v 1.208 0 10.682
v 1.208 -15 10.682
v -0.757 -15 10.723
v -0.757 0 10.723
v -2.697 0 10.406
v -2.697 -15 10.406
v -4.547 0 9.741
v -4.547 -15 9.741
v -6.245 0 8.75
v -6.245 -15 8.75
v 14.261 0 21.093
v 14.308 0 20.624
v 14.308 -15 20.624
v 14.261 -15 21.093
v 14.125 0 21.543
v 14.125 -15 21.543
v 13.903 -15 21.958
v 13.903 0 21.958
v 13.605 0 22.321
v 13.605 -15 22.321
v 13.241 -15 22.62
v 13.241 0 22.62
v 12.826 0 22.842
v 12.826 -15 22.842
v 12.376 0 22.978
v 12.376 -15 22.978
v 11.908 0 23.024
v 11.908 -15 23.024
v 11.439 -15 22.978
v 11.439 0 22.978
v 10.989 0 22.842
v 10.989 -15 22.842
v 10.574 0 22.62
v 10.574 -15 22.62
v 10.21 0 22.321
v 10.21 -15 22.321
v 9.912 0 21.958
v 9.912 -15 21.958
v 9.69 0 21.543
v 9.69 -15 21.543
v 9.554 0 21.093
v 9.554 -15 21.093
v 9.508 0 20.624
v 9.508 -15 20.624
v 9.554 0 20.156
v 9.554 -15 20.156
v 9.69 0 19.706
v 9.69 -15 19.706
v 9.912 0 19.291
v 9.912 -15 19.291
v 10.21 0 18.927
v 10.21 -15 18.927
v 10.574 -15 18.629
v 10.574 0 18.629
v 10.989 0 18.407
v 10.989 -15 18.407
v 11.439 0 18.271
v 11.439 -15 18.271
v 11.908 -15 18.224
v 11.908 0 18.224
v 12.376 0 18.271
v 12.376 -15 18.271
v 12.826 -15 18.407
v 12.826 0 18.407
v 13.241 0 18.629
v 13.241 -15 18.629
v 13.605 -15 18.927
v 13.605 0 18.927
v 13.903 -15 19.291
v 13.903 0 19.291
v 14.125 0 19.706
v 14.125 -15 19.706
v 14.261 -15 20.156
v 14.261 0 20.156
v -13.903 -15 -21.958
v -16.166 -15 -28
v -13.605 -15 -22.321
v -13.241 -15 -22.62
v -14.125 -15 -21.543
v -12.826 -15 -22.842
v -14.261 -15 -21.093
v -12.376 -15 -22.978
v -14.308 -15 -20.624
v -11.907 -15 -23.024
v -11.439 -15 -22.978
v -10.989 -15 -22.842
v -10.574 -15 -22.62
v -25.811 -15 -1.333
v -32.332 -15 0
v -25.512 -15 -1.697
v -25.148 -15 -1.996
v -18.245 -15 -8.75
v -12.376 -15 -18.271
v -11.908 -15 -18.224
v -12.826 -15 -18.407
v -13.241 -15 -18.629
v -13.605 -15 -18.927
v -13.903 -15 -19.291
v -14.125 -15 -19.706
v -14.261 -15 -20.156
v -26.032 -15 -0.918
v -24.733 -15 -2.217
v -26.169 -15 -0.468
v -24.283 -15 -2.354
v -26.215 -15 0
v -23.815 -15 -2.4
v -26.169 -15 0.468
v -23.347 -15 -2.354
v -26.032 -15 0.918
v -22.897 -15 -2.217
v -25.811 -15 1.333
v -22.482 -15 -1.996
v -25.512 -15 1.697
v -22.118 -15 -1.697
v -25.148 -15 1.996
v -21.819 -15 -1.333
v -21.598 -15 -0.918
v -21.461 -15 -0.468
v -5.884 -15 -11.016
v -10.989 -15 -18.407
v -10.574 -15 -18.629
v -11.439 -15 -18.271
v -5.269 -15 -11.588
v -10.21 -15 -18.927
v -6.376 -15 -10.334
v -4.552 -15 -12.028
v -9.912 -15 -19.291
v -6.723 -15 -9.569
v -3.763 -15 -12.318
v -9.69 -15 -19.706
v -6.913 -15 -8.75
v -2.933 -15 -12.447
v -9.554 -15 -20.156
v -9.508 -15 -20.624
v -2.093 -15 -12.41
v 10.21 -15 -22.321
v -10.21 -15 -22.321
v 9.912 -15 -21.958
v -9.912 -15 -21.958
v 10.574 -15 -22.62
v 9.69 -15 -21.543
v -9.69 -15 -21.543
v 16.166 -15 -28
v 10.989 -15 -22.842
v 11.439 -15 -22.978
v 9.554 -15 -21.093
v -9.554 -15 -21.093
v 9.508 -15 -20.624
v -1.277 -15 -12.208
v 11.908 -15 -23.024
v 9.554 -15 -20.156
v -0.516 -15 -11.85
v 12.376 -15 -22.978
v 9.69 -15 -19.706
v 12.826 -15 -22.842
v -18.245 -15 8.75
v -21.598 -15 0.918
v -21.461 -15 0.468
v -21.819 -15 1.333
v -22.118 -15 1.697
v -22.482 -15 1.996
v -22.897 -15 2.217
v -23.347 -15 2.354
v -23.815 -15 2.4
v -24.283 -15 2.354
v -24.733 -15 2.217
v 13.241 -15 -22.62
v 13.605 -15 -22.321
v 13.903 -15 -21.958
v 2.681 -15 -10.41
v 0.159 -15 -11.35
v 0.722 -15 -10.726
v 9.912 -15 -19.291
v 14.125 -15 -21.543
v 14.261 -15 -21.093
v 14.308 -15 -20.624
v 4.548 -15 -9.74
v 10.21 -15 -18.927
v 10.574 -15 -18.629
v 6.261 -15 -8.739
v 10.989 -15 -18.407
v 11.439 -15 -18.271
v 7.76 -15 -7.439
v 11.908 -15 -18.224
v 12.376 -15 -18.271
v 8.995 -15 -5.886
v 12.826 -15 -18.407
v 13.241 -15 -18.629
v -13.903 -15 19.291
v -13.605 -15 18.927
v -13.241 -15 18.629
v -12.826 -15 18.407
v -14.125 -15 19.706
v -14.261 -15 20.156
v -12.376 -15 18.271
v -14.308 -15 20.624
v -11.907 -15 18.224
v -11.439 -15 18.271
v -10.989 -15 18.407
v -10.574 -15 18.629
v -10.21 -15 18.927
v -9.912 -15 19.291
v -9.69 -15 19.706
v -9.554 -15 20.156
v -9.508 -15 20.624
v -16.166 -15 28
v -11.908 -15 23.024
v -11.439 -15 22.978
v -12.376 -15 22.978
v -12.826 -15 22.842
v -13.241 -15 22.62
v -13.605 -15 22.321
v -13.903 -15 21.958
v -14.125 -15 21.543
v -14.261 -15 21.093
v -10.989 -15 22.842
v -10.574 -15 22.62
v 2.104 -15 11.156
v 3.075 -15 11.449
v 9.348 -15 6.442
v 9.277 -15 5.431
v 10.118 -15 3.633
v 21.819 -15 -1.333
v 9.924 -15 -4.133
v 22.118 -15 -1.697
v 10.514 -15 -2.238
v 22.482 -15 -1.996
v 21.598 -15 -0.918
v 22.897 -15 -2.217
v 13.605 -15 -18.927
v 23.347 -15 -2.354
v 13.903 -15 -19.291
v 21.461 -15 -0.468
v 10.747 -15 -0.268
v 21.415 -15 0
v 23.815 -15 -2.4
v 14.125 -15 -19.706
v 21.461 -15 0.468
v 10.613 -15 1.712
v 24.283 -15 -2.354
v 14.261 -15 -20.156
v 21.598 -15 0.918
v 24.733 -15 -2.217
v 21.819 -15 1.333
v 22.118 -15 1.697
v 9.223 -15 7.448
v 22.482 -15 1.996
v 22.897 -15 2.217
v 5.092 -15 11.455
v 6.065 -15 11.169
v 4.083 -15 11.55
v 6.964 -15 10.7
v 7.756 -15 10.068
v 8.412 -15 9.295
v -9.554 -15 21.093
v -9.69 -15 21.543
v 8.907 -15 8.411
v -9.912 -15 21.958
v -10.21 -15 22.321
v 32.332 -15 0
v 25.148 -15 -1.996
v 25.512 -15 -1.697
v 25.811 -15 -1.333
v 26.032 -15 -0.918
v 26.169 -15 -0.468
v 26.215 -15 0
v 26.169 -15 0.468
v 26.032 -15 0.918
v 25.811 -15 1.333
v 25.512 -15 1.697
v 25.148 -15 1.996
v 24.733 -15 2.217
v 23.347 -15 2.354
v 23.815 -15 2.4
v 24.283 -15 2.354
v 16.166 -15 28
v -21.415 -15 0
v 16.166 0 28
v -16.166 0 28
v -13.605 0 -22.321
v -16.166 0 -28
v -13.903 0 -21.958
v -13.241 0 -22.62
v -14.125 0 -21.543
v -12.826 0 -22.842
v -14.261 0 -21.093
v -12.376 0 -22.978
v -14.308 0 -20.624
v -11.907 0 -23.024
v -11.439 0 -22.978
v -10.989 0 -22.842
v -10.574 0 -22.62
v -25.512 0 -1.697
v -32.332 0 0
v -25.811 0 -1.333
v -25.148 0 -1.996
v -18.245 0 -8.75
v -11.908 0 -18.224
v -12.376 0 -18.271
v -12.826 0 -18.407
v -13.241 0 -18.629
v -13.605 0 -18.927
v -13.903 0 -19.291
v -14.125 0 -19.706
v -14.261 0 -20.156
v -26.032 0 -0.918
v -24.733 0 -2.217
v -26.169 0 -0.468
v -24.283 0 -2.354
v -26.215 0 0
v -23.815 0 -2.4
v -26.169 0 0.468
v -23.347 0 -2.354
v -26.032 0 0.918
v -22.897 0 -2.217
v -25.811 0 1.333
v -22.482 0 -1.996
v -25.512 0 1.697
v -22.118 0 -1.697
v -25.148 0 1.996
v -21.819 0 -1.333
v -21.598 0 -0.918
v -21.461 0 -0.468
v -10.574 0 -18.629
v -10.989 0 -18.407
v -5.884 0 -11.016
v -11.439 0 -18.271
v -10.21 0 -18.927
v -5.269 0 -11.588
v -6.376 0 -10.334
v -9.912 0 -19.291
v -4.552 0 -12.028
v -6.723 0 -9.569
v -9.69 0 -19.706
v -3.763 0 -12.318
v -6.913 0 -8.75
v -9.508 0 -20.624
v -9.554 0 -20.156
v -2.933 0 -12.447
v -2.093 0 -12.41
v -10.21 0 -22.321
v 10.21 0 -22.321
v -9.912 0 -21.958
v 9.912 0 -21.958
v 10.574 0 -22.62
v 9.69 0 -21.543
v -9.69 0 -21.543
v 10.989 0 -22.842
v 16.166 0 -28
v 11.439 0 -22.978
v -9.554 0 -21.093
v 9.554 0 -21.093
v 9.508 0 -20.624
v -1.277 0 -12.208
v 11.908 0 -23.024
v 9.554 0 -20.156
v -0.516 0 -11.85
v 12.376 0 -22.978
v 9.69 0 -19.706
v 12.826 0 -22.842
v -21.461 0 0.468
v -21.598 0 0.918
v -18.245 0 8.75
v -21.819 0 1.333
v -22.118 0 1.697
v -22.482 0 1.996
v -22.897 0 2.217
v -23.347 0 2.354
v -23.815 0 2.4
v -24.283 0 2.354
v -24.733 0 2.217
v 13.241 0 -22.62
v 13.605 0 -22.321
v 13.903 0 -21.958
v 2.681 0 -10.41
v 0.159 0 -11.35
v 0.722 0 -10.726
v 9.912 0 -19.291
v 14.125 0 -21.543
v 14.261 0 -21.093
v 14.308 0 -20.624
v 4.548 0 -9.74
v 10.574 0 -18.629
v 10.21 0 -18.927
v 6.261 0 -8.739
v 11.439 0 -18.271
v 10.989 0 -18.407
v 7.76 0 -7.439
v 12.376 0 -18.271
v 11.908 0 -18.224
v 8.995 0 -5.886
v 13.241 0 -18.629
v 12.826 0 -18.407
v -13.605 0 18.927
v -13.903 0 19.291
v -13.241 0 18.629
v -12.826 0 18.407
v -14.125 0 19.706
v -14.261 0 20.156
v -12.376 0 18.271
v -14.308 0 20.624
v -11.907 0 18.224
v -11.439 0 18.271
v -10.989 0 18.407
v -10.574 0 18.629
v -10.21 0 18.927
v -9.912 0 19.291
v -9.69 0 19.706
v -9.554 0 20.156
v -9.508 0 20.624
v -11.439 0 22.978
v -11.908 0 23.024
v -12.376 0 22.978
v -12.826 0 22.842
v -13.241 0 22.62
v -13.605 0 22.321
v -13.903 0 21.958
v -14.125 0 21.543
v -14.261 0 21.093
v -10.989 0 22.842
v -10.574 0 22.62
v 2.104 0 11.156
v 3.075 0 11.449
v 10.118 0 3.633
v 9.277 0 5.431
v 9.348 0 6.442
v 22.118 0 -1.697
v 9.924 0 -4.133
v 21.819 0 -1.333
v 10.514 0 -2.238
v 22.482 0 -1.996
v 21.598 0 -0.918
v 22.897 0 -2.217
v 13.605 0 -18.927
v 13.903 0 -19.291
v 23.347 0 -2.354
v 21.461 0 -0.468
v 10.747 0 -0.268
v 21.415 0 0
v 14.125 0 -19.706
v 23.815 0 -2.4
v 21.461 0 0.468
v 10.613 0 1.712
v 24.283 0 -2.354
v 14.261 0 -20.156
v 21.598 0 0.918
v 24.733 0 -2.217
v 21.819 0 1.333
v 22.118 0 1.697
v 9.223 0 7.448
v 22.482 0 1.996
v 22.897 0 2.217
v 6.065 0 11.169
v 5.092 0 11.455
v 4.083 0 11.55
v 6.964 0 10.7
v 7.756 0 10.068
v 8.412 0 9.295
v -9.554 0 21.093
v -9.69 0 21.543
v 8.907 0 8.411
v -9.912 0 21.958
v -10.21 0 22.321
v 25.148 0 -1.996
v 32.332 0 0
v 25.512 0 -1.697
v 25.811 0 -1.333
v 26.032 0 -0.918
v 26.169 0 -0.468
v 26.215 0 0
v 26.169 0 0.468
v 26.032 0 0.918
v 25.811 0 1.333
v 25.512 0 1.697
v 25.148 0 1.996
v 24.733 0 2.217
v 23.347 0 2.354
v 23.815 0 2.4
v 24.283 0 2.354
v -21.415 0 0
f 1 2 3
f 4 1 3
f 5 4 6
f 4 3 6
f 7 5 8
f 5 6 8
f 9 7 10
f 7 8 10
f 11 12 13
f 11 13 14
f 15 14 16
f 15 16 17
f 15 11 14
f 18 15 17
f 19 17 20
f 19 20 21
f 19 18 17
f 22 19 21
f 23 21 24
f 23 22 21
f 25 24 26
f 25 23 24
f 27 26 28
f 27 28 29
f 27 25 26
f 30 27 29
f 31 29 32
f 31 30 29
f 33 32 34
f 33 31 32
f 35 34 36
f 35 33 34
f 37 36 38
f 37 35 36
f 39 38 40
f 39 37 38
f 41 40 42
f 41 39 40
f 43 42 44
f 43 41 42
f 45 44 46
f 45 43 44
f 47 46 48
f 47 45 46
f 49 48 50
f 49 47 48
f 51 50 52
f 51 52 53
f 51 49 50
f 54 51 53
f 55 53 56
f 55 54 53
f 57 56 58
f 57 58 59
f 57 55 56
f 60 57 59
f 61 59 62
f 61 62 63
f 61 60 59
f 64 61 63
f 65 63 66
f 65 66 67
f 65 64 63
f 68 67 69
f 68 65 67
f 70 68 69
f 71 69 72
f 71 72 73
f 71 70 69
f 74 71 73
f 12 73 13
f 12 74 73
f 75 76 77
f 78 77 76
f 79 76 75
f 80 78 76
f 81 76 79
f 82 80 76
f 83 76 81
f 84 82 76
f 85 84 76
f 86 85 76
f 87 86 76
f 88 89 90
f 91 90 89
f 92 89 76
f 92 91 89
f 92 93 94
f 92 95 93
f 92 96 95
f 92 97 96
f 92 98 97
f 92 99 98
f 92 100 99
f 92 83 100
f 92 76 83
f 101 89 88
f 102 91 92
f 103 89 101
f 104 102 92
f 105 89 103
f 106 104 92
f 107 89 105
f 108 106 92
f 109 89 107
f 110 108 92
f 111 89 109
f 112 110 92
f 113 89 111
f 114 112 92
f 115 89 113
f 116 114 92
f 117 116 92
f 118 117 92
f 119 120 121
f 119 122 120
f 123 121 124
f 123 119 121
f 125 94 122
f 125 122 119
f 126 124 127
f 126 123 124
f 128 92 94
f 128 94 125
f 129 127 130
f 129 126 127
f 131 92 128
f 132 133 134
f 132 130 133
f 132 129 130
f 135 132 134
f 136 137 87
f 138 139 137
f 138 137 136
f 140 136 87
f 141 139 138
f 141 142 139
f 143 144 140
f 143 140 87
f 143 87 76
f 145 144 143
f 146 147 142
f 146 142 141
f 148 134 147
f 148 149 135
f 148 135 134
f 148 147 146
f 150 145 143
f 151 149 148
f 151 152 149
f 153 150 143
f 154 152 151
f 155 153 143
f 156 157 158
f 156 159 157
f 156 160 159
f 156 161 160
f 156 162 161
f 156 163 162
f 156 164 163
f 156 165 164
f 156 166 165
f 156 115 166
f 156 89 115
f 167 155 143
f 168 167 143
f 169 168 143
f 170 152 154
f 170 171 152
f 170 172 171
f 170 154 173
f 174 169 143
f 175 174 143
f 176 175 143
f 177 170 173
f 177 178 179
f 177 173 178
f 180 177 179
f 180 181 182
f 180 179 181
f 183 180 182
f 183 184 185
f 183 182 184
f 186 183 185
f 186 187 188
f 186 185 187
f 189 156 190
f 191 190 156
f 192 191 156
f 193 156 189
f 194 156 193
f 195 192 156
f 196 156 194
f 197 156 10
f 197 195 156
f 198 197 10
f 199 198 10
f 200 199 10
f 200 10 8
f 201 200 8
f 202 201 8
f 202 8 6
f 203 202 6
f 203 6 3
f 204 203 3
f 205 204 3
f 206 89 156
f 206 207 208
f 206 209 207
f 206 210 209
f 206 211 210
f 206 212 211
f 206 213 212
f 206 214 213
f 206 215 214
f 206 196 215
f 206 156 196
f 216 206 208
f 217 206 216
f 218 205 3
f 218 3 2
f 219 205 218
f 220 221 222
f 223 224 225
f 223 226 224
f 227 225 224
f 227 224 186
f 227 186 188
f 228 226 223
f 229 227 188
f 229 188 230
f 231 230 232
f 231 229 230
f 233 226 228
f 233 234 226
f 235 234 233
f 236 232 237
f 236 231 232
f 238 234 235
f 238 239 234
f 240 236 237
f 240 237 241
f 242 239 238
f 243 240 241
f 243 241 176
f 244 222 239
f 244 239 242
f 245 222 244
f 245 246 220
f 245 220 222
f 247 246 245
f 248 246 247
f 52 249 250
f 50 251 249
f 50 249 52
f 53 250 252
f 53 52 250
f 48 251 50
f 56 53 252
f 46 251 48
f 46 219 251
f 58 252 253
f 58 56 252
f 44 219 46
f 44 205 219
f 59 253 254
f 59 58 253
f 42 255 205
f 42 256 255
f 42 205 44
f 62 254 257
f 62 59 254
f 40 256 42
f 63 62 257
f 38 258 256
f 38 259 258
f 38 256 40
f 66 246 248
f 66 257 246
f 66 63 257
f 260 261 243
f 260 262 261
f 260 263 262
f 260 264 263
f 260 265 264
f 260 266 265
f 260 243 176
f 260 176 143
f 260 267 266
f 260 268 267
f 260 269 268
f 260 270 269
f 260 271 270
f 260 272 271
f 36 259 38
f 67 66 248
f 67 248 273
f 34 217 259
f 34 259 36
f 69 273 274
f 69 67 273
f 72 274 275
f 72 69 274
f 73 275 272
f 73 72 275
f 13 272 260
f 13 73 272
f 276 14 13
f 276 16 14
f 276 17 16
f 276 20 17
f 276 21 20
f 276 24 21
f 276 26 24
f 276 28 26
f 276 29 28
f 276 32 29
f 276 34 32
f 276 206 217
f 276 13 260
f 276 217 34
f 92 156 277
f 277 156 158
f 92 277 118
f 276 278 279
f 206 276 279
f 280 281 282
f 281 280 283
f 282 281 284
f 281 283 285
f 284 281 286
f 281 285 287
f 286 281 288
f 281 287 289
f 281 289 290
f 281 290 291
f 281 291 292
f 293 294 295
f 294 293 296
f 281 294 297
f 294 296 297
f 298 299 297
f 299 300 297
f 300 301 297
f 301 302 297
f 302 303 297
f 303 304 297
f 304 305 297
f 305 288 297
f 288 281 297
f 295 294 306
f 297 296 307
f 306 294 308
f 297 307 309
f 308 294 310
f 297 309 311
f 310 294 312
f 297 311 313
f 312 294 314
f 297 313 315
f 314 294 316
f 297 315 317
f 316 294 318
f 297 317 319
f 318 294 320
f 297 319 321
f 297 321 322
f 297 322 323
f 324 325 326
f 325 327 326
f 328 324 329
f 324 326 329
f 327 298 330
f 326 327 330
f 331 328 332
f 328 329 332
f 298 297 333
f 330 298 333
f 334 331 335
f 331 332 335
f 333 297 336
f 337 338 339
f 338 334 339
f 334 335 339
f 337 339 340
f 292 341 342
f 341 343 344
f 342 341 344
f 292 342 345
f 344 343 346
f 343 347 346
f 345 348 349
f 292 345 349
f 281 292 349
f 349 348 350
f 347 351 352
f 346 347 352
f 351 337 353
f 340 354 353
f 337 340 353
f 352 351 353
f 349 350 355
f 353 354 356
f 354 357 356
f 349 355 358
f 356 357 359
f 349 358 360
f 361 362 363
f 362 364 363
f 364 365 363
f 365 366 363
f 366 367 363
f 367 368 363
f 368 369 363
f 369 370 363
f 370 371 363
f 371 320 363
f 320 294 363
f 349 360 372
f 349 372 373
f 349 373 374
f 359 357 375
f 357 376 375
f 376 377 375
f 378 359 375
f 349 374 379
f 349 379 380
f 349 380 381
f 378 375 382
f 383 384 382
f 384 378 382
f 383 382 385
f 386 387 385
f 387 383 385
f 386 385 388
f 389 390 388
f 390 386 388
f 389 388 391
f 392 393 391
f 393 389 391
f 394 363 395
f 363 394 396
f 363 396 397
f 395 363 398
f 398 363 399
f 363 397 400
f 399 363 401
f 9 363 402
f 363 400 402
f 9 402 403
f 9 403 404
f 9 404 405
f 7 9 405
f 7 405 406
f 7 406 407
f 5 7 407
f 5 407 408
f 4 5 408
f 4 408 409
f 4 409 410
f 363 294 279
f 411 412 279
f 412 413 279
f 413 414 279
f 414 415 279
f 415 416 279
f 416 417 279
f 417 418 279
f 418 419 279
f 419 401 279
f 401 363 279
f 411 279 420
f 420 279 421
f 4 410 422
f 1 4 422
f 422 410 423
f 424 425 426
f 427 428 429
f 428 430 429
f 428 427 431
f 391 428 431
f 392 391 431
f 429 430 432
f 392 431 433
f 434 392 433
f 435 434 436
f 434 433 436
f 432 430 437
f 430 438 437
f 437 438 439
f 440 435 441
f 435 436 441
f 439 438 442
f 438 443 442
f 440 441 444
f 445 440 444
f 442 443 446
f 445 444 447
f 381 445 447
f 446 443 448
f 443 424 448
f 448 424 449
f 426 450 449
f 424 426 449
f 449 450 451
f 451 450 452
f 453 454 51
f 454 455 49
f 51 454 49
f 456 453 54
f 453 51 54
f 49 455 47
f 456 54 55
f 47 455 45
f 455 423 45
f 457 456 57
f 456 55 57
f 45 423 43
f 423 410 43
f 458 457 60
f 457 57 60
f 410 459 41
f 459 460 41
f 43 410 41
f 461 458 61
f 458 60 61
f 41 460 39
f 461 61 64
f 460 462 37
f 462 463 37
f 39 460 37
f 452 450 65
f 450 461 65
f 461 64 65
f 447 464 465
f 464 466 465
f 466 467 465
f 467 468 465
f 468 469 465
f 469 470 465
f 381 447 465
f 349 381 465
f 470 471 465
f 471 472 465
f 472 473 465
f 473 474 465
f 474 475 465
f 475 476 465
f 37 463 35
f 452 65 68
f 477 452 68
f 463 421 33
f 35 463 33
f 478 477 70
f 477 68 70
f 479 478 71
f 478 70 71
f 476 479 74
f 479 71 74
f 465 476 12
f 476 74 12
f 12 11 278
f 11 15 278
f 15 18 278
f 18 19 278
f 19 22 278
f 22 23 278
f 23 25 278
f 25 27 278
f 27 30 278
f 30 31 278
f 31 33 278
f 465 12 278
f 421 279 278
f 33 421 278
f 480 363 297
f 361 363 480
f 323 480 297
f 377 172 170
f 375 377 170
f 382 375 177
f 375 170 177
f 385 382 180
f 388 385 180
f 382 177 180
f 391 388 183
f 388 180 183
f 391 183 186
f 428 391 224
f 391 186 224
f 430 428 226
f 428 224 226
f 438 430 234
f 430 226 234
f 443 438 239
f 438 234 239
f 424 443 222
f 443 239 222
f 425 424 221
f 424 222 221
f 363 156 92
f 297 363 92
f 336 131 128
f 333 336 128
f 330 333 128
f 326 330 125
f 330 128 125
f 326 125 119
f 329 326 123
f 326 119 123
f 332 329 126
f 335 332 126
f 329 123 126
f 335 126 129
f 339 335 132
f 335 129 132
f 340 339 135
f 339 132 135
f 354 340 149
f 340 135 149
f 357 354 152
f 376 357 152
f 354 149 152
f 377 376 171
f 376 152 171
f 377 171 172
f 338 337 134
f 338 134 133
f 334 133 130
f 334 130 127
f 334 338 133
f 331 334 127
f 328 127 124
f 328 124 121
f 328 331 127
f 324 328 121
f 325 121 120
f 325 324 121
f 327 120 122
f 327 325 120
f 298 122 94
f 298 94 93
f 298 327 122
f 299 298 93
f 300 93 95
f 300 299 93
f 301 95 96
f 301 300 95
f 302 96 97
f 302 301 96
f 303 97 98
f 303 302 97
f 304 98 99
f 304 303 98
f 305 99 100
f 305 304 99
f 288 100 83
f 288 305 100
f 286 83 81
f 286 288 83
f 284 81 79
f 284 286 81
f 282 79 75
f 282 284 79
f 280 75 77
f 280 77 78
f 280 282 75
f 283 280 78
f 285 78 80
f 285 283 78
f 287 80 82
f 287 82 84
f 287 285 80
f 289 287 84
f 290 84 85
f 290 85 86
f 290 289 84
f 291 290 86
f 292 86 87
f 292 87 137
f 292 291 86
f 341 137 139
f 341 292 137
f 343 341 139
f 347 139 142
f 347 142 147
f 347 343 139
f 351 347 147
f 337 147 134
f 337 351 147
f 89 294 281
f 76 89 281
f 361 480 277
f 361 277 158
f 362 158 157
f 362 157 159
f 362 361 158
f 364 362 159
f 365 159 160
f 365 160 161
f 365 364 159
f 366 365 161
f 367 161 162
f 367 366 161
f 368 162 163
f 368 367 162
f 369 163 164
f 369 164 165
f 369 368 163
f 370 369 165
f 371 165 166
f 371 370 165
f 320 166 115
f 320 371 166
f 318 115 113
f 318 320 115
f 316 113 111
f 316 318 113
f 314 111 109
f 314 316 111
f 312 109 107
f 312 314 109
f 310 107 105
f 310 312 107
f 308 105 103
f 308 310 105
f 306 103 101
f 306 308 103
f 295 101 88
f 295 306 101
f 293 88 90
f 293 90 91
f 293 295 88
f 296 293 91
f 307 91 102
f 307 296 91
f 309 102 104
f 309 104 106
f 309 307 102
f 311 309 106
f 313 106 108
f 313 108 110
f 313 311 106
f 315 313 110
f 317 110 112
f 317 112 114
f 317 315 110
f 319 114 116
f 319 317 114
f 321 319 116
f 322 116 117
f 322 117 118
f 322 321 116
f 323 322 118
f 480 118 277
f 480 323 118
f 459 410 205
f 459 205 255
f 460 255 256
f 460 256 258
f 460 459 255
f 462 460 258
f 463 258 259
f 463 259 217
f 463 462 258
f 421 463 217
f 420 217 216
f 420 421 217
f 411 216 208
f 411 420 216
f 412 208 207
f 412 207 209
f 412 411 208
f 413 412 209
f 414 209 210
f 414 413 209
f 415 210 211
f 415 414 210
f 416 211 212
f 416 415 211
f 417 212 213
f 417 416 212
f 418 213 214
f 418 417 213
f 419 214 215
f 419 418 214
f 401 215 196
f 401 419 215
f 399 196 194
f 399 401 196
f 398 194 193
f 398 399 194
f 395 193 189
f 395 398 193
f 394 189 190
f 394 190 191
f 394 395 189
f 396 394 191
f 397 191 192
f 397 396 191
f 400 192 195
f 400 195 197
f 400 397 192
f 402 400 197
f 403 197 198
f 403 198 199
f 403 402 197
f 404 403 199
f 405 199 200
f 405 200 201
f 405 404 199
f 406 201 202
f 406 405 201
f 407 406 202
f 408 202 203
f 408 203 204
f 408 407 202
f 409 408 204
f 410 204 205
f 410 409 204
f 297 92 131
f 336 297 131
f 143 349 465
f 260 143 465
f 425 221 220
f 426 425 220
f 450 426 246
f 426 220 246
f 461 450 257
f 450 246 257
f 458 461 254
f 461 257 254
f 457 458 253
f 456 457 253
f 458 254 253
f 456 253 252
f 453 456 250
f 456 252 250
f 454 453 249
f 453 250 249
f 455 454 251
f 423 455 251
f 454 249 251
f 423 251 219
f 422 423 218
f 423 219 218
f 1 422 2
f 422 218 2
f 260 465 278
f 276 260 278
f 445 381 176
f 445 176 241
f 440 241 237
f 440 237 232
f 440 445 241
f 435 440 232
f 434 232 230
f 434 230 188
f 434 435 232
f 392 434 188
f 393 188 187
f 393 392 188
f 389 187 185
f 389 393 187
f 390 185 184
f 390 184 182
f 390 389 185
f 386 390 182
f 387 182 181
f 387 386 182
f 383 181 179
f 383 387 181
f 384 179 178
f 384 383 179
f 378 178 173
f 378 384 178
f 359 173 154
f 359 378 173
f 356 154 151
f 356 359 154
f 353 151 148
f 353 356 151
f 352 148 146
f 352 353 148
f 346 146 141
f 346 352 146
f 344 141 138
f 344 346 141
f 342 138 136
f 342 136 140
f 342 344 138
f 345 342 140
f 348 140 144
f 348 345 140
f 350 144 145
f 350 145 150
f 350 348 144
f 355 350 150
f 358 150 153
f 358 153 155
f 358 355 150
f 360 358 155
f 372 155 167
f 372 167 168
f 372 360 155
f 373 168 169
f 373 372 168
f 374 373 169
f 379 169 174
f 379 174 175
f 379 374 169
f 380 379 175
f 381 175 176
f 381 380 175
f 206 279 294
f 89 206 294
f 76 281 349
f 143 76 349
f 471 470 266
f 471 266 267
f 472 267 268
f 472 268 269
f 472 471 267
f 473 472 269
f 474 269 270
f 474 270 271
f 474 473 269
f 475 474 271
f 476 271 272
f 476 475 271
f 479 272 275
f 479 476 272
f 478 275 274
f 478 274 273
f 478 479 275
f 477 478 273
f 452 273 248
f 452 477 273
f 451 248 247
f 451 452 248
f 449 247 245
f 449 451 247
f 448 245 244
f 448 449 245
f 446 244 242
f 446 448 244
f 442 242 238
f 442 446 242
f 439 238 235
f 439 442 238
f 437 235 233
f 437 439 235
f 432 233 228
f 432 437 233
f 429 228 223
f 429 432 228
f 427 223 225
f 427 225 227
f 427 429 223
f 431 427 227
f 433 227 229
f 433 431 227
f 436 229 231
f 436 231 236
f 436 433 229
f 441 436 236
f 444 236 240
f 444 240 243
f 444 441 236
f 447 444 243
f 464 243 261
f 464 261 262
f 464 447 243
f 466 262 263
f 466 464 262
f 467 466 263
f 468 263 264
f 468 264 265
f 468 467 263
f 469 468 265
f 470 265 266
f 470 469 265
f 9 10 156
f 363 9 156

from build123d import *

# Parameters (mm, degrees)
F0_R     = 2.4
F1_DEPTH = 15
F3_DEPTH = 25


with BuildPart() as f1:
    # F0 (on Front) → F1 (new body)
    with BuildSketch(Plane.XZ):
        Polygon((16.165808, 28), (-16.165808, 28), (-32.331615, 0), (-16.165808, -28), (16.165808, -28), (32.331615, 0), align=None)
        with Locations((-11.9075, -20.624395)):
            Circle(F0_R, mode=Mode.SUBTRACT)
        with Locations((11.9075, -20.624395)):
            Circle(F0_R, mode=Mode.SUBTRACT)
        with Locations((-23.815, 0)):
            Circle(F0_R, mode=Mode.SUBTRACT)
        with Locations((-11.9075, 20.624395)):
            Circle(F0_R, mode=Mode.SUBTRACT)
        with Locations((23.815, 0)):
            Circle(F0_R, mode=Mode.SUBTRACT)
        with Locations((11.9075, 20.624395)):
            Circle(F0_R, mode=Mode.SUBTRACT)
    extrude(amount=F1_DEPTH)

    # F2 (on face) → F3 (cut)
    with BuildSketch(Plane.XZ.offset(15)):
        with BuildLine():
            ThreePointArc((-6.913185, -8.75), (-3.76319, -12.31774), (0.721978, -10.725728))
            ThreePointArc((0.721978, -10.725728), (9.500181, -5.03081), (9.277499, 5.430516))
            ThreePointArc((9.277499, 5.430516), (6.963643, 10.700233), (1.208341, 10.681873))
            ThreePointArc((1.208341, 10.681873), (-2.697223, 10.406127), (-6.244998, 8.75))
            Line((-6.244998, 8.75), (-18.244998, 8.75))
            Line((-18.244998, 8.75), (-18.244998, -8.75))
            Line((-18.244998, -8.75), (-6.913185, -8.75))
        make_face()
    extrude(amount=-F3_DEPTH, mode=Mode.SUBTRACT)


solid = f1.part
